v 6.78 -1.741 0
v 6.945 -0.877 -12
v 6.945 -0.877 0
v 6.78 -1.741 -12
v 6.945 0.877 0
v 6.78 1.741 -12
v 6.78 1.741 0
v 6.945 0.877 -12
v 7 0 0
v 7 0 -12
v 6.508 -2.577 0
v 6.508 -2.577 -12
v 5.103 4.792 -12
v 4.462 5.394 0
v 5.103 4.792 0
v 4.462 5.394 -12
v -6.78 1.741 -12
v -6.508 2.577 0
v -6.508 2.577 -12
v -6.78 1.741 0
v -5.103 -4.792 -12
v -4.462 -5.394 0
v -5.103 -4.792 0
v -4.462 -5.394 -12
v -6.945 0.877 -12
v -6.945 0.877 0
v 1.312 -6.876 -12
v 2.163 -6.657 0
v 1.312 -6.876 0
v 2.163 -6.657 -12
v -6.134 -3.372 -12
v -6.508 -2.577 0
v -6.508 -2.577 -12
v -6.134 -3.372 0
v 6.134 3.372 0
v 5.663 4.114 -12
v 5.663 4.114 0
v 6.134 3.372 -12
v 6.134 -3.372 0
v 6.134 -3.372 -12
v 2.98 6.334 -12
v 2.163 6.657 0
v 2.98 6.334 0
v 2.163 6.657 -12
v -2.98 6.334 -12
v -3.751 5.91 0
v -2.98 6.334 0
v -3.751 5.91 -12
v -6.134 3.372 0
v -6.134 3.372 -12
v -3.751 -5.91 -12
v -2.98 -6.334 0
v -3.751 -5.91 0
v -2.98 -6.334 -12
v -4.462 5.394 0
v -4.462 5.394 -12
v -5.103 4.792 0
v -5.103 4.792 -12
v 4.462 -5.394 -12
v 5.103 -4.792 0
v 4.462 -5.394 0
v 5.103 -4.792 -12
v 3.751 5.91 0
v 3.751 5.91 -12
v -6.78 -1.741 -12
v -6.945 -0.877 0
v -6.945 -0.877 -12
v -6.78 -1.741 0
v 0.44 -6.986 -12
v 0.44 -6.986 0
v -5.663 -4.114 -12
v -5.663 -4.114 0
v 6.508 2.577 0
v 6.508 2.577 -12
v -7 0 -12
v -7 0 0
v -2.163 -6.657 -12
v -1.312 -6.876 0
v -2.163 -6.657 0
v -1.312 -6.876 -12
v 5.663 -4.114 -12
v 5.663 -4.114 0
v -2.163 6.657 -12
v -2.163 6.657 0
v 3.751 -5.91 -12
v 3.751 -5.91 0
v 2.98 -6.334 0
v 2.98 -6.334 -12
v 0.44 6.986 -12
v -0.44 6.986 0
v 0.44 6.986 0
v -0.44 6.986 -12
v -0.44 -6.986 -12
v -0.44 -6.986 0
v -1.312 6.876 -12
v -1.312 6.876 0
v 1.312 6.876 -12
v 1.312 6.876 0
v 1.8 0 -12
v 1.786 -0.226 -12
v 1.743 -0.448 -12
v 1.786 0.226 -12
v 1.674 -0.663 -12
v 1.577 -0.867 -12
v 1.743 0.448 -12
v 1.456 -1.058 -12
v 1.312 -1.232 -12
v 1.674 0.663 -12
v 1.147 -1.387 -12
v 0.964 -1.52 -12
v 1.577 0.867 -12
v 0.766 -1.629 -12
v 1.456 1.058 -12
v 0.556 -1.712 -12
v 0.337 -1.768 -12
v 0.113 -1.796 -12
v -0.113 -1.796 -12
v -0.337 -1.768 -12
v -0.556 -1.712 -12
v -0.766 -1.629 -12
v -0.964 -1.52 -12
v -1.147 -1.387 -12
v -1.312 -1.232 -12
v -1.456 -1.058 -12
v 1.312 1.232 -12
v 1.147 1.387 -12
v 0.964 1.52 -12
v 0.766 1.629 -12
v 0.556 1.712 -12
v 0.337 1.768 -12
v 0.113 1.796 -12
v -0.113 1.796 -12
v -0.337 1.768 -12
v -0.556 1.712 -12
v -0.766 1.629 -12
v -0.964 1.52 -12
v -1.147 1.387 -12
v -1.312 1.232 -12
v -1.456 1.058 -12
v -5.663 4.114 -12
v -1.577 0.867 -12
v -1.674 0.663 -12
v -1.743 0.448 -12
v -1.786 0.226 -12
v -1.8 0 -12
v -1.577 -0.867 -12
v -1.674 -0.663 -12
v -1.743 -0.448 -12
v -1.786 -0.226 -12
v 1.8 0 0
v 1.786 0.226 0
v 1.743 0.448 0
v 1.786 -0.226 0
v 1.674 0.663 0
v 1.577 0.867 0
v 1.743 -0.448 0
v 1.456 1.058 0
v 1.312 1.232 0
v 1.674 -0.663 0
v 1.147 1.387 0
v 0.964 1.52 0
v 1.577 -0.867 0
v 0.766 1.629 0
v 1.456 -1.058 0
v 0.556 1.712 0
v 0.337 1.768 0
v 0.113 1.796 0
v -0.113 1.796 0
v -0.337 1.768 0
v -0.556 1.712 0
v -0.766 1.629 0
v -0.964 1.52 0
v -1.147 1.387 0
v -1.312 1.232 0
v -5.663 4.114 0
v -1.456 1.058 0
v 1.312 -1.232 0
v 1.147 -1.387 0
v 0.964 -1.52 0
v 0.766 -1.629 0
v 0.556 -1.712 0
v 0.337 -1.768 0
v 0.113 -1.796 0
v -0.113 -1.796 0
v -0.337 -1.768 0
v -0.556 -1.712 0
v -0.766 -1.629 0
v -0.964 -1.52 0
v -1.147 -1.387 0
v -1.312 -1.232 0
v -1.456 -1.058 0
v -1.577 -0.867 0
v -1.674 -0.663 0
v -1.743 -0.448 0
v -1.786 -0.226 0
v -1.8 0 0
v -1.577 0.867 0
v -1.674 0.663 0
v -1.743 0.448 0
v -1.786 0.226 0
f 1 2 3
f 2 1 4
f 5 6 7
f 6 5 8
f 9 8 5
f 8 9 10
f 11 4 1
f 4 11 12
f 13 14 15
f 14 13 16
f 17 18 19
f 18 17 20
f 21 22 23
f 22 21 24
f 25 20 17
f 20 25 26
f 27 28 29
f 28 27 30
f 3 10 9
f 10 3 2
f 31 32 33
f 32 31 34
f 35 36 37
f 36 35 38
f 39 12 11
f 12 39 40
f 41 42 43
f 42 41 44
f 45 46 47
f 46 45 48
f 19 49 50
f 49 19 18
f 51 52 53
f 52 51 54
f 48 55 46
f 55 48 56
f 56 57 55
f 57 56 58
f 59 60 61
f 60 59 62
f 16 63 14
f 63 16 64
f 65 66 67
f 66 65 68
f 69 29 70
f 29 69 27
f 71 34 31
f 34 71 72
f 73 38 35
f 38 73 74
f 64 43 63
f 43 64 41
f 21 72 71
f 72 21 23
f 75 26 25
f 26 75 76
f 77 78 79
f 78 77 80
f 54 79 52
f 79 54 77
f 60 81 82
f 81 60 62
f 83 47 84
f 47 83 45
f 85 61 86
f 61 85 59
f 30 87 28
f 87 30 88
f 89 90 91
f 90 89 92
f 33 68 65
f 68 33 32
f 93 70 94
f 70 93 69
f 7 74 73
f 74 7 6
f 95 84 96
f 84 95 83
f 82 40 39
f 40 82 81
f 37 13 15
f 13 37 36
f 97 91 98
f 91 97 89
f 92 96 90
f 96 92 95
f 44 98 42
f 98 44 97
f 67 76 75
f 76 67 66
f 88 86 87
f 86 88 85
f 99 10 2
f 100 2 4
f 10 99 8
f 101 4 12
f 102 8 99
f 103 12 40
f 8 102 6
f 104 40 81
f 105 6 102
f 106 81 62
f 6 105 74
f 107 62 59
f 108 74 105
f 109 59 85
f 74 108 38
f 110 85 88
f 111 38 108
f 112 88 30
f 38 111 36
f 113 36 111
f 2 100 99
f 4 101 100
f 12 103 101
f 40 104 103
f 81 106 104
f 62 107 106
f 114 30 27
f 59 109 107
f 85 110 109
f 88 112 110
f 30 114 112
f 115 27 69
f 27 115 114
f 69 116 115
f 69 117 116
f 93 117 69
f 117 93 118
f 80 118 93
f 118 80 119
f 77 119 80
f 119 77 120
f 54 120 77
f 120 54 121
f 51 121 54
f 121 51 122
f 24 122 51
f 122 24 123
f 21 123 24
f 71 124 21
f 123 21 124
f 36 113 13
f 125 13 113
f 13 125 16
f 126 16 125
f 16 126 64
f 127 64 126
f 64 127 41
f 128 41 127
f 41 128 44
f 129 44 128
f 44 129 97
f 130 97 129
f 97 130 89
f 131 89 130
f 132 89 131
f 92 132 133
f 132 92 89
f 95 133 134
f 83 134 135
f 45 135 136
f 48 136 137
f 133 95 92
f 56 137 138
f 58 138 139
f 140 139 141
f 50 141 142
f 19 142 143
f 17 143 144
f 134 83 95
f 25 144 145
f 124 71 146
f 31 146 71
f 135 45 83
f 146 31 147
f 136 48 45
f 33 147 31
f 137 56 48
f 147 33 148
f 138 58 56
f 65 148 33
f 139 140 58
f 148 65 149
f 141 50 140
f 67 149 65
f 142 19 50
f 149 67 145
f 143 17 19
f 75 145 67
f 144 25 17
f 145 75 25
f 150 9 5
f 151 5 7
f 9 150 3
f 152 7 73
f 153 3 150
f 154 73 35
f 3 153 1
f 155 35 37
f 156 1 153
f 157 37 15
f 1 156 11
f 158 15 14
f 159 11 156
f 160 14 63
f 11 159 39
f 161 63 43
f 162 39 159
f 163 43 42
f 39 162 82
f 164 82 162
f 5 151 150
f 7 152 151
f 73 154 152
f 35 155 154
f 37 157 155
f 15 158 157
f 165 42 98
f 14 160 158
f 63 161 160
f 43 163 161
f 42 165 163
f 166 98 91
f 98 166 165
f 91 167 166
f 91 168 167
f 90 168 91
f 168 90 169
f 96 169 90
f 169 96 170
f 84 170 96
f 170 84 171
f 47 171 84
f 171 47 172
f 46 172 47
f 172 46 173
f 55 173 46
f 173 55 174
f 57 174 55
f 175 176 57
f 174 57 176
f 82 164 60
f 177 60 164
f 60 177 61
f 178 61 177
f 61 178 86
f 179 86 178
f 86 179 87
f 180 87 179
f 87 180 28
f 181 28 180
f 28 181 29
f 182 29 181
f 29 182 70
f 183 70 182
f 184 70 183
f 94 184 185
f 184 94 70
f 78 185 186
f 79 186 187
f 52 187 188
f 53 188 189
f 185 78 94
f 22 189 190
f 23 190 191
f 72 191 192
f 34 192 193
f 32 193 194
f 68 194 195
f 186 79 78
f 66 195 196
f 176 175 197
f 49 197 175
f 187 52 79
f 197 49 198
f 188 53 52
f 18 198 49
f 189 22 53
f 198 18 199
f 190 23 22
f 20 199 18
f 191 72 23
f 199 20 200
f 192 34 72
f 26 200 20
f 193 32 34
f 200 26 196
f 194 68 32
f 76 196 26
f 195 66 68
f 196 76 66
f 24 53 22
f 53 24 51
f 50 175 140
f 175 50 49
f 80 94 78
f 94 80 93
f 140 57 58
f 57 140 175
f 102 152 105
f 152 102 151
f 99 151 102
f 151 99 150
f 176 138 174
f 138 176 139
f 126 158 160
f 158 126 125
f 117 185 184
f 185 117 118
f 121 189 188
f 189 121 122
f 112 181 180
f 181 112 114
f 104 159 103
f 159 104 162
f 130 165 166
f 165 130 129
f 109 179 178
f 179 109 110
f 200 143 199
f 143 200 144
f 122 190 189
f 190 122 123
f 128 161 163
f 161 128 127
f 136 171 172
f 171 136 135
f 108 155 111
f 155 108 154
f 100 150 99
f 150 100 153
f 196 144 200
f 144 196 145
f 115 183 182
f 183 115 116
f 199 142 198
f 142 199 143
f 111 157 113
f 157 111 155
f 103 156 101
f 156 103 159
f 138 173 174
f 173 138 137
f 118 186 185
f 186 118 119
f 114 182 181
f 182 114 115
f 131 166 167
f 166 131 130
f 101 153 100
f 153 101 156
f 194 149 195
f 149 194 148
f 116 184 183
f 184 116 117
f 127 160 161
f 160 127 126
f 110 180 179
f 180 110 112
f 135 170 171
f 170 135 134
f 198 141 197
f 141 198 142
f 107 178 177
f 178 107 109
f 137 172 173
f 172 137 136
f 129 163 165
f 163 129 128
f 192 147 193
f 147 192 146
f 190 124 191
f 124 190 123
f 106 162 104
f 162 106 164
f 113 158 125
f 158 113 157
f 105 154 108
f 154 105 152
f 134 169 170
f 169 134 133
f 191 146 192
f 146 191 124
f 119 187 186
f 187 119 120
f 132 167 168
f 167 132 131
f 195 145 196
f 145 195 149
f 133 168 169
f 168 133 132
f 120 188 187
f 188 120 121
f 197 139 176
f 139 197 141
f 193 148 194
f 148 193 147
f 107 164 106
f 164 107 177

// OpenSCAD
$fn = 50;


difference() {
	union() {
		translate(v = [0, 0, -12.0000000000]) {
			cylinder(h = 12, r = 7.0000000000);
		}
		cylinder(h = 0, r = 17.0000000000);
	}
	union() {
		#translate(v = [0, 0, -12]) {
			cylinder(h = 12, r = 1.8000000000);
		}
	}
}
